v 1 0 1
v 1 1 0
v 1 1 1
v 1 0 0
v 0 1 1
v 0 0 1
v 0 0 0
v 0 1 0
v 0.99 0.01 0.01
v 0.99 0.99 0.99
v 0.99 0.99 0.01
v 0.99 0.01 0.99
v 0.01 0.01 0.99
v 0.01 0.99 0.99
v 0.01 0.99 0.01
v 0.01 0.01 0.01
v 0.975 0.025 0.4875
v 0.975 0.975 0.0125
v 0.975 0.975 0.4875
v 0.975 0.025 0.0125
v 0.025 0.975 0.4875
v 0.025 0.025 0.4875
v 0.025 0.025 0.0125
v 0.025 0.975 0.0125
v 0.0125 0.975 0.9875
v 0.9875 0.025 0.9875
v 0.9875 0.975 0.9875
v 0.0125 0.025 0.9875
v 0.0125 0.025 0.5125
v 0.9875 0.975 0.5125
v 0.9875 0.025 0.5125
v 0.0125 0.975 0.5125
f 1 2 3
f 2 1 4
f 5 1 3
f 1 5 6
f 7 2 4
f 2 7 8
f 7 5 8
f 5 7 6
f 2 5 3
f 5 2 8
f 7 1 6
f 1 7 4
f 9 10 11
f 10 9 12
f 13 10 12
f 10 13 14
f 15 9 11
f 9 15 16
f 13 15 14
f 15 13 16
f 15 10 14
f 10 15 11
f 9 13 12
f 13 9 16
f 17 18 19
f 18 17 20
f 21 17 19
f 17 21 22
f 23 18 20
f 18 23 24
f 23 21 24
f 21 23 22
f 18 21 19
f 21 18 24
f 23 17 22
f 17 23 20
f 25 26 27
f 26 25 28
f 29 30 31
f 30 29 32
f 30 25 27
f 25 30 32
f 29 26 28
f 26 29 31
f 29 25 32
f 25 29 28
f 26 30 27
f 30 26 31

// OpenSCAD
translate([0.5, 0.5, 0.25]) color([0.33009817895383553, 0.6358447971330878, 0.274476683198677]) cube([0.95, 0.95, 0.475], center=true);
translate([0.5, 0.5, 0.75]) color([0.7036882936284021, 0.9548751840233447, 0.5755708060880032]) cube([0.95, 0.95, 0.475], center=true);
translate([0.5, 0.5, 0.75]) color([0.41204698353559877, 0.5796286851254486, 0.28286322414623355]) cube([0.95, 0.95, 0.475], center=true);
translate([0.5, 0.5, 0.75]) color([0.83488960487533, 0.7968053445508819, 0.9111606805714901]) cube([0.95, 0.95, 0.475], center=true);
translate([0.5, 0.5, 0.75]) color([0.24277728252059738, 0.2698201644401115, 0.25372921938475945]) cube([0.95, 0.95, 0.475], center=true);
translate([0.5, 0.5, 0.75]) color([0.3248429479181304, 0.33731838939050207, 0.46012102584031667]) cube([0.95, 0.95, 0.475], center=true);
translate([0.5, 0.5, 0.75]) color([0.4972140619467261, 0.4460540182101679, 0.582257111213957]) cube([0.95, 0.95, 0.475], center=true);
translate([0.5, 0.5, 0.75]) color([0.38189019333285656, 0.9329183366158048, 0.74346568951076]) cube([0.95, 0.95, 0.475], center=true);
translate([0.5, 0.5, 0.75]) color([0.10367473231816282, 0.6513301228797536, 0.21210212161149367]) cube([0.95, 0.95, 0.475], center=true);
translate([0.5, 0.5, 0.75]) color([0.4071949612628585, 0.6715659813617996, 0.17871221391606673]) cube([0.95, 0.95, 0.475], center=true);
translate([0.25, 0.5, 0.75]) color([0.17752412341011714, 0.6556599876579107, 0.7040052939421468]) cube([0.475, 0.95, 0.475], center=true);
translate([0.75, 0.5, 0.75]) color([0.9236087761692187, 0.21340315940002685, 0.5989435772305987]) cube([0.475, 0.95, 0.475], center=true);
translate([0.75, 0.5, 0.75]) color([0.8450733127471588, 0.6003349610680997, 0.5954496070156984]) cube([0.475, 0.95, 0.475], center=true);
translate([0.75, 0.5, 0.75]) color([0.920709623693076, 0.4233833186292486, 0.4754938941291812]) cube([0.475, 0.95, 0.475], center=true);
translate([0.75, 0.5, 0.75]) color([0.872421437716006, 0.9767589381362137, 0.9086126193256788]) cube([0.475, 0.95, 0.475], center=true);
translate([0.75, 0.5, 0.75]) color([0.7884233486788577, 0.8262914624918754, 0.6636415038118221]) cube([0.475, 0.95, 0.475], center=true);
color([0.3,0.3,0.3,0.3]) difference() { cube([1,1,1]); translate([0.01,0.01,0.01]) cube([0.98,0.98,0.98]); }
